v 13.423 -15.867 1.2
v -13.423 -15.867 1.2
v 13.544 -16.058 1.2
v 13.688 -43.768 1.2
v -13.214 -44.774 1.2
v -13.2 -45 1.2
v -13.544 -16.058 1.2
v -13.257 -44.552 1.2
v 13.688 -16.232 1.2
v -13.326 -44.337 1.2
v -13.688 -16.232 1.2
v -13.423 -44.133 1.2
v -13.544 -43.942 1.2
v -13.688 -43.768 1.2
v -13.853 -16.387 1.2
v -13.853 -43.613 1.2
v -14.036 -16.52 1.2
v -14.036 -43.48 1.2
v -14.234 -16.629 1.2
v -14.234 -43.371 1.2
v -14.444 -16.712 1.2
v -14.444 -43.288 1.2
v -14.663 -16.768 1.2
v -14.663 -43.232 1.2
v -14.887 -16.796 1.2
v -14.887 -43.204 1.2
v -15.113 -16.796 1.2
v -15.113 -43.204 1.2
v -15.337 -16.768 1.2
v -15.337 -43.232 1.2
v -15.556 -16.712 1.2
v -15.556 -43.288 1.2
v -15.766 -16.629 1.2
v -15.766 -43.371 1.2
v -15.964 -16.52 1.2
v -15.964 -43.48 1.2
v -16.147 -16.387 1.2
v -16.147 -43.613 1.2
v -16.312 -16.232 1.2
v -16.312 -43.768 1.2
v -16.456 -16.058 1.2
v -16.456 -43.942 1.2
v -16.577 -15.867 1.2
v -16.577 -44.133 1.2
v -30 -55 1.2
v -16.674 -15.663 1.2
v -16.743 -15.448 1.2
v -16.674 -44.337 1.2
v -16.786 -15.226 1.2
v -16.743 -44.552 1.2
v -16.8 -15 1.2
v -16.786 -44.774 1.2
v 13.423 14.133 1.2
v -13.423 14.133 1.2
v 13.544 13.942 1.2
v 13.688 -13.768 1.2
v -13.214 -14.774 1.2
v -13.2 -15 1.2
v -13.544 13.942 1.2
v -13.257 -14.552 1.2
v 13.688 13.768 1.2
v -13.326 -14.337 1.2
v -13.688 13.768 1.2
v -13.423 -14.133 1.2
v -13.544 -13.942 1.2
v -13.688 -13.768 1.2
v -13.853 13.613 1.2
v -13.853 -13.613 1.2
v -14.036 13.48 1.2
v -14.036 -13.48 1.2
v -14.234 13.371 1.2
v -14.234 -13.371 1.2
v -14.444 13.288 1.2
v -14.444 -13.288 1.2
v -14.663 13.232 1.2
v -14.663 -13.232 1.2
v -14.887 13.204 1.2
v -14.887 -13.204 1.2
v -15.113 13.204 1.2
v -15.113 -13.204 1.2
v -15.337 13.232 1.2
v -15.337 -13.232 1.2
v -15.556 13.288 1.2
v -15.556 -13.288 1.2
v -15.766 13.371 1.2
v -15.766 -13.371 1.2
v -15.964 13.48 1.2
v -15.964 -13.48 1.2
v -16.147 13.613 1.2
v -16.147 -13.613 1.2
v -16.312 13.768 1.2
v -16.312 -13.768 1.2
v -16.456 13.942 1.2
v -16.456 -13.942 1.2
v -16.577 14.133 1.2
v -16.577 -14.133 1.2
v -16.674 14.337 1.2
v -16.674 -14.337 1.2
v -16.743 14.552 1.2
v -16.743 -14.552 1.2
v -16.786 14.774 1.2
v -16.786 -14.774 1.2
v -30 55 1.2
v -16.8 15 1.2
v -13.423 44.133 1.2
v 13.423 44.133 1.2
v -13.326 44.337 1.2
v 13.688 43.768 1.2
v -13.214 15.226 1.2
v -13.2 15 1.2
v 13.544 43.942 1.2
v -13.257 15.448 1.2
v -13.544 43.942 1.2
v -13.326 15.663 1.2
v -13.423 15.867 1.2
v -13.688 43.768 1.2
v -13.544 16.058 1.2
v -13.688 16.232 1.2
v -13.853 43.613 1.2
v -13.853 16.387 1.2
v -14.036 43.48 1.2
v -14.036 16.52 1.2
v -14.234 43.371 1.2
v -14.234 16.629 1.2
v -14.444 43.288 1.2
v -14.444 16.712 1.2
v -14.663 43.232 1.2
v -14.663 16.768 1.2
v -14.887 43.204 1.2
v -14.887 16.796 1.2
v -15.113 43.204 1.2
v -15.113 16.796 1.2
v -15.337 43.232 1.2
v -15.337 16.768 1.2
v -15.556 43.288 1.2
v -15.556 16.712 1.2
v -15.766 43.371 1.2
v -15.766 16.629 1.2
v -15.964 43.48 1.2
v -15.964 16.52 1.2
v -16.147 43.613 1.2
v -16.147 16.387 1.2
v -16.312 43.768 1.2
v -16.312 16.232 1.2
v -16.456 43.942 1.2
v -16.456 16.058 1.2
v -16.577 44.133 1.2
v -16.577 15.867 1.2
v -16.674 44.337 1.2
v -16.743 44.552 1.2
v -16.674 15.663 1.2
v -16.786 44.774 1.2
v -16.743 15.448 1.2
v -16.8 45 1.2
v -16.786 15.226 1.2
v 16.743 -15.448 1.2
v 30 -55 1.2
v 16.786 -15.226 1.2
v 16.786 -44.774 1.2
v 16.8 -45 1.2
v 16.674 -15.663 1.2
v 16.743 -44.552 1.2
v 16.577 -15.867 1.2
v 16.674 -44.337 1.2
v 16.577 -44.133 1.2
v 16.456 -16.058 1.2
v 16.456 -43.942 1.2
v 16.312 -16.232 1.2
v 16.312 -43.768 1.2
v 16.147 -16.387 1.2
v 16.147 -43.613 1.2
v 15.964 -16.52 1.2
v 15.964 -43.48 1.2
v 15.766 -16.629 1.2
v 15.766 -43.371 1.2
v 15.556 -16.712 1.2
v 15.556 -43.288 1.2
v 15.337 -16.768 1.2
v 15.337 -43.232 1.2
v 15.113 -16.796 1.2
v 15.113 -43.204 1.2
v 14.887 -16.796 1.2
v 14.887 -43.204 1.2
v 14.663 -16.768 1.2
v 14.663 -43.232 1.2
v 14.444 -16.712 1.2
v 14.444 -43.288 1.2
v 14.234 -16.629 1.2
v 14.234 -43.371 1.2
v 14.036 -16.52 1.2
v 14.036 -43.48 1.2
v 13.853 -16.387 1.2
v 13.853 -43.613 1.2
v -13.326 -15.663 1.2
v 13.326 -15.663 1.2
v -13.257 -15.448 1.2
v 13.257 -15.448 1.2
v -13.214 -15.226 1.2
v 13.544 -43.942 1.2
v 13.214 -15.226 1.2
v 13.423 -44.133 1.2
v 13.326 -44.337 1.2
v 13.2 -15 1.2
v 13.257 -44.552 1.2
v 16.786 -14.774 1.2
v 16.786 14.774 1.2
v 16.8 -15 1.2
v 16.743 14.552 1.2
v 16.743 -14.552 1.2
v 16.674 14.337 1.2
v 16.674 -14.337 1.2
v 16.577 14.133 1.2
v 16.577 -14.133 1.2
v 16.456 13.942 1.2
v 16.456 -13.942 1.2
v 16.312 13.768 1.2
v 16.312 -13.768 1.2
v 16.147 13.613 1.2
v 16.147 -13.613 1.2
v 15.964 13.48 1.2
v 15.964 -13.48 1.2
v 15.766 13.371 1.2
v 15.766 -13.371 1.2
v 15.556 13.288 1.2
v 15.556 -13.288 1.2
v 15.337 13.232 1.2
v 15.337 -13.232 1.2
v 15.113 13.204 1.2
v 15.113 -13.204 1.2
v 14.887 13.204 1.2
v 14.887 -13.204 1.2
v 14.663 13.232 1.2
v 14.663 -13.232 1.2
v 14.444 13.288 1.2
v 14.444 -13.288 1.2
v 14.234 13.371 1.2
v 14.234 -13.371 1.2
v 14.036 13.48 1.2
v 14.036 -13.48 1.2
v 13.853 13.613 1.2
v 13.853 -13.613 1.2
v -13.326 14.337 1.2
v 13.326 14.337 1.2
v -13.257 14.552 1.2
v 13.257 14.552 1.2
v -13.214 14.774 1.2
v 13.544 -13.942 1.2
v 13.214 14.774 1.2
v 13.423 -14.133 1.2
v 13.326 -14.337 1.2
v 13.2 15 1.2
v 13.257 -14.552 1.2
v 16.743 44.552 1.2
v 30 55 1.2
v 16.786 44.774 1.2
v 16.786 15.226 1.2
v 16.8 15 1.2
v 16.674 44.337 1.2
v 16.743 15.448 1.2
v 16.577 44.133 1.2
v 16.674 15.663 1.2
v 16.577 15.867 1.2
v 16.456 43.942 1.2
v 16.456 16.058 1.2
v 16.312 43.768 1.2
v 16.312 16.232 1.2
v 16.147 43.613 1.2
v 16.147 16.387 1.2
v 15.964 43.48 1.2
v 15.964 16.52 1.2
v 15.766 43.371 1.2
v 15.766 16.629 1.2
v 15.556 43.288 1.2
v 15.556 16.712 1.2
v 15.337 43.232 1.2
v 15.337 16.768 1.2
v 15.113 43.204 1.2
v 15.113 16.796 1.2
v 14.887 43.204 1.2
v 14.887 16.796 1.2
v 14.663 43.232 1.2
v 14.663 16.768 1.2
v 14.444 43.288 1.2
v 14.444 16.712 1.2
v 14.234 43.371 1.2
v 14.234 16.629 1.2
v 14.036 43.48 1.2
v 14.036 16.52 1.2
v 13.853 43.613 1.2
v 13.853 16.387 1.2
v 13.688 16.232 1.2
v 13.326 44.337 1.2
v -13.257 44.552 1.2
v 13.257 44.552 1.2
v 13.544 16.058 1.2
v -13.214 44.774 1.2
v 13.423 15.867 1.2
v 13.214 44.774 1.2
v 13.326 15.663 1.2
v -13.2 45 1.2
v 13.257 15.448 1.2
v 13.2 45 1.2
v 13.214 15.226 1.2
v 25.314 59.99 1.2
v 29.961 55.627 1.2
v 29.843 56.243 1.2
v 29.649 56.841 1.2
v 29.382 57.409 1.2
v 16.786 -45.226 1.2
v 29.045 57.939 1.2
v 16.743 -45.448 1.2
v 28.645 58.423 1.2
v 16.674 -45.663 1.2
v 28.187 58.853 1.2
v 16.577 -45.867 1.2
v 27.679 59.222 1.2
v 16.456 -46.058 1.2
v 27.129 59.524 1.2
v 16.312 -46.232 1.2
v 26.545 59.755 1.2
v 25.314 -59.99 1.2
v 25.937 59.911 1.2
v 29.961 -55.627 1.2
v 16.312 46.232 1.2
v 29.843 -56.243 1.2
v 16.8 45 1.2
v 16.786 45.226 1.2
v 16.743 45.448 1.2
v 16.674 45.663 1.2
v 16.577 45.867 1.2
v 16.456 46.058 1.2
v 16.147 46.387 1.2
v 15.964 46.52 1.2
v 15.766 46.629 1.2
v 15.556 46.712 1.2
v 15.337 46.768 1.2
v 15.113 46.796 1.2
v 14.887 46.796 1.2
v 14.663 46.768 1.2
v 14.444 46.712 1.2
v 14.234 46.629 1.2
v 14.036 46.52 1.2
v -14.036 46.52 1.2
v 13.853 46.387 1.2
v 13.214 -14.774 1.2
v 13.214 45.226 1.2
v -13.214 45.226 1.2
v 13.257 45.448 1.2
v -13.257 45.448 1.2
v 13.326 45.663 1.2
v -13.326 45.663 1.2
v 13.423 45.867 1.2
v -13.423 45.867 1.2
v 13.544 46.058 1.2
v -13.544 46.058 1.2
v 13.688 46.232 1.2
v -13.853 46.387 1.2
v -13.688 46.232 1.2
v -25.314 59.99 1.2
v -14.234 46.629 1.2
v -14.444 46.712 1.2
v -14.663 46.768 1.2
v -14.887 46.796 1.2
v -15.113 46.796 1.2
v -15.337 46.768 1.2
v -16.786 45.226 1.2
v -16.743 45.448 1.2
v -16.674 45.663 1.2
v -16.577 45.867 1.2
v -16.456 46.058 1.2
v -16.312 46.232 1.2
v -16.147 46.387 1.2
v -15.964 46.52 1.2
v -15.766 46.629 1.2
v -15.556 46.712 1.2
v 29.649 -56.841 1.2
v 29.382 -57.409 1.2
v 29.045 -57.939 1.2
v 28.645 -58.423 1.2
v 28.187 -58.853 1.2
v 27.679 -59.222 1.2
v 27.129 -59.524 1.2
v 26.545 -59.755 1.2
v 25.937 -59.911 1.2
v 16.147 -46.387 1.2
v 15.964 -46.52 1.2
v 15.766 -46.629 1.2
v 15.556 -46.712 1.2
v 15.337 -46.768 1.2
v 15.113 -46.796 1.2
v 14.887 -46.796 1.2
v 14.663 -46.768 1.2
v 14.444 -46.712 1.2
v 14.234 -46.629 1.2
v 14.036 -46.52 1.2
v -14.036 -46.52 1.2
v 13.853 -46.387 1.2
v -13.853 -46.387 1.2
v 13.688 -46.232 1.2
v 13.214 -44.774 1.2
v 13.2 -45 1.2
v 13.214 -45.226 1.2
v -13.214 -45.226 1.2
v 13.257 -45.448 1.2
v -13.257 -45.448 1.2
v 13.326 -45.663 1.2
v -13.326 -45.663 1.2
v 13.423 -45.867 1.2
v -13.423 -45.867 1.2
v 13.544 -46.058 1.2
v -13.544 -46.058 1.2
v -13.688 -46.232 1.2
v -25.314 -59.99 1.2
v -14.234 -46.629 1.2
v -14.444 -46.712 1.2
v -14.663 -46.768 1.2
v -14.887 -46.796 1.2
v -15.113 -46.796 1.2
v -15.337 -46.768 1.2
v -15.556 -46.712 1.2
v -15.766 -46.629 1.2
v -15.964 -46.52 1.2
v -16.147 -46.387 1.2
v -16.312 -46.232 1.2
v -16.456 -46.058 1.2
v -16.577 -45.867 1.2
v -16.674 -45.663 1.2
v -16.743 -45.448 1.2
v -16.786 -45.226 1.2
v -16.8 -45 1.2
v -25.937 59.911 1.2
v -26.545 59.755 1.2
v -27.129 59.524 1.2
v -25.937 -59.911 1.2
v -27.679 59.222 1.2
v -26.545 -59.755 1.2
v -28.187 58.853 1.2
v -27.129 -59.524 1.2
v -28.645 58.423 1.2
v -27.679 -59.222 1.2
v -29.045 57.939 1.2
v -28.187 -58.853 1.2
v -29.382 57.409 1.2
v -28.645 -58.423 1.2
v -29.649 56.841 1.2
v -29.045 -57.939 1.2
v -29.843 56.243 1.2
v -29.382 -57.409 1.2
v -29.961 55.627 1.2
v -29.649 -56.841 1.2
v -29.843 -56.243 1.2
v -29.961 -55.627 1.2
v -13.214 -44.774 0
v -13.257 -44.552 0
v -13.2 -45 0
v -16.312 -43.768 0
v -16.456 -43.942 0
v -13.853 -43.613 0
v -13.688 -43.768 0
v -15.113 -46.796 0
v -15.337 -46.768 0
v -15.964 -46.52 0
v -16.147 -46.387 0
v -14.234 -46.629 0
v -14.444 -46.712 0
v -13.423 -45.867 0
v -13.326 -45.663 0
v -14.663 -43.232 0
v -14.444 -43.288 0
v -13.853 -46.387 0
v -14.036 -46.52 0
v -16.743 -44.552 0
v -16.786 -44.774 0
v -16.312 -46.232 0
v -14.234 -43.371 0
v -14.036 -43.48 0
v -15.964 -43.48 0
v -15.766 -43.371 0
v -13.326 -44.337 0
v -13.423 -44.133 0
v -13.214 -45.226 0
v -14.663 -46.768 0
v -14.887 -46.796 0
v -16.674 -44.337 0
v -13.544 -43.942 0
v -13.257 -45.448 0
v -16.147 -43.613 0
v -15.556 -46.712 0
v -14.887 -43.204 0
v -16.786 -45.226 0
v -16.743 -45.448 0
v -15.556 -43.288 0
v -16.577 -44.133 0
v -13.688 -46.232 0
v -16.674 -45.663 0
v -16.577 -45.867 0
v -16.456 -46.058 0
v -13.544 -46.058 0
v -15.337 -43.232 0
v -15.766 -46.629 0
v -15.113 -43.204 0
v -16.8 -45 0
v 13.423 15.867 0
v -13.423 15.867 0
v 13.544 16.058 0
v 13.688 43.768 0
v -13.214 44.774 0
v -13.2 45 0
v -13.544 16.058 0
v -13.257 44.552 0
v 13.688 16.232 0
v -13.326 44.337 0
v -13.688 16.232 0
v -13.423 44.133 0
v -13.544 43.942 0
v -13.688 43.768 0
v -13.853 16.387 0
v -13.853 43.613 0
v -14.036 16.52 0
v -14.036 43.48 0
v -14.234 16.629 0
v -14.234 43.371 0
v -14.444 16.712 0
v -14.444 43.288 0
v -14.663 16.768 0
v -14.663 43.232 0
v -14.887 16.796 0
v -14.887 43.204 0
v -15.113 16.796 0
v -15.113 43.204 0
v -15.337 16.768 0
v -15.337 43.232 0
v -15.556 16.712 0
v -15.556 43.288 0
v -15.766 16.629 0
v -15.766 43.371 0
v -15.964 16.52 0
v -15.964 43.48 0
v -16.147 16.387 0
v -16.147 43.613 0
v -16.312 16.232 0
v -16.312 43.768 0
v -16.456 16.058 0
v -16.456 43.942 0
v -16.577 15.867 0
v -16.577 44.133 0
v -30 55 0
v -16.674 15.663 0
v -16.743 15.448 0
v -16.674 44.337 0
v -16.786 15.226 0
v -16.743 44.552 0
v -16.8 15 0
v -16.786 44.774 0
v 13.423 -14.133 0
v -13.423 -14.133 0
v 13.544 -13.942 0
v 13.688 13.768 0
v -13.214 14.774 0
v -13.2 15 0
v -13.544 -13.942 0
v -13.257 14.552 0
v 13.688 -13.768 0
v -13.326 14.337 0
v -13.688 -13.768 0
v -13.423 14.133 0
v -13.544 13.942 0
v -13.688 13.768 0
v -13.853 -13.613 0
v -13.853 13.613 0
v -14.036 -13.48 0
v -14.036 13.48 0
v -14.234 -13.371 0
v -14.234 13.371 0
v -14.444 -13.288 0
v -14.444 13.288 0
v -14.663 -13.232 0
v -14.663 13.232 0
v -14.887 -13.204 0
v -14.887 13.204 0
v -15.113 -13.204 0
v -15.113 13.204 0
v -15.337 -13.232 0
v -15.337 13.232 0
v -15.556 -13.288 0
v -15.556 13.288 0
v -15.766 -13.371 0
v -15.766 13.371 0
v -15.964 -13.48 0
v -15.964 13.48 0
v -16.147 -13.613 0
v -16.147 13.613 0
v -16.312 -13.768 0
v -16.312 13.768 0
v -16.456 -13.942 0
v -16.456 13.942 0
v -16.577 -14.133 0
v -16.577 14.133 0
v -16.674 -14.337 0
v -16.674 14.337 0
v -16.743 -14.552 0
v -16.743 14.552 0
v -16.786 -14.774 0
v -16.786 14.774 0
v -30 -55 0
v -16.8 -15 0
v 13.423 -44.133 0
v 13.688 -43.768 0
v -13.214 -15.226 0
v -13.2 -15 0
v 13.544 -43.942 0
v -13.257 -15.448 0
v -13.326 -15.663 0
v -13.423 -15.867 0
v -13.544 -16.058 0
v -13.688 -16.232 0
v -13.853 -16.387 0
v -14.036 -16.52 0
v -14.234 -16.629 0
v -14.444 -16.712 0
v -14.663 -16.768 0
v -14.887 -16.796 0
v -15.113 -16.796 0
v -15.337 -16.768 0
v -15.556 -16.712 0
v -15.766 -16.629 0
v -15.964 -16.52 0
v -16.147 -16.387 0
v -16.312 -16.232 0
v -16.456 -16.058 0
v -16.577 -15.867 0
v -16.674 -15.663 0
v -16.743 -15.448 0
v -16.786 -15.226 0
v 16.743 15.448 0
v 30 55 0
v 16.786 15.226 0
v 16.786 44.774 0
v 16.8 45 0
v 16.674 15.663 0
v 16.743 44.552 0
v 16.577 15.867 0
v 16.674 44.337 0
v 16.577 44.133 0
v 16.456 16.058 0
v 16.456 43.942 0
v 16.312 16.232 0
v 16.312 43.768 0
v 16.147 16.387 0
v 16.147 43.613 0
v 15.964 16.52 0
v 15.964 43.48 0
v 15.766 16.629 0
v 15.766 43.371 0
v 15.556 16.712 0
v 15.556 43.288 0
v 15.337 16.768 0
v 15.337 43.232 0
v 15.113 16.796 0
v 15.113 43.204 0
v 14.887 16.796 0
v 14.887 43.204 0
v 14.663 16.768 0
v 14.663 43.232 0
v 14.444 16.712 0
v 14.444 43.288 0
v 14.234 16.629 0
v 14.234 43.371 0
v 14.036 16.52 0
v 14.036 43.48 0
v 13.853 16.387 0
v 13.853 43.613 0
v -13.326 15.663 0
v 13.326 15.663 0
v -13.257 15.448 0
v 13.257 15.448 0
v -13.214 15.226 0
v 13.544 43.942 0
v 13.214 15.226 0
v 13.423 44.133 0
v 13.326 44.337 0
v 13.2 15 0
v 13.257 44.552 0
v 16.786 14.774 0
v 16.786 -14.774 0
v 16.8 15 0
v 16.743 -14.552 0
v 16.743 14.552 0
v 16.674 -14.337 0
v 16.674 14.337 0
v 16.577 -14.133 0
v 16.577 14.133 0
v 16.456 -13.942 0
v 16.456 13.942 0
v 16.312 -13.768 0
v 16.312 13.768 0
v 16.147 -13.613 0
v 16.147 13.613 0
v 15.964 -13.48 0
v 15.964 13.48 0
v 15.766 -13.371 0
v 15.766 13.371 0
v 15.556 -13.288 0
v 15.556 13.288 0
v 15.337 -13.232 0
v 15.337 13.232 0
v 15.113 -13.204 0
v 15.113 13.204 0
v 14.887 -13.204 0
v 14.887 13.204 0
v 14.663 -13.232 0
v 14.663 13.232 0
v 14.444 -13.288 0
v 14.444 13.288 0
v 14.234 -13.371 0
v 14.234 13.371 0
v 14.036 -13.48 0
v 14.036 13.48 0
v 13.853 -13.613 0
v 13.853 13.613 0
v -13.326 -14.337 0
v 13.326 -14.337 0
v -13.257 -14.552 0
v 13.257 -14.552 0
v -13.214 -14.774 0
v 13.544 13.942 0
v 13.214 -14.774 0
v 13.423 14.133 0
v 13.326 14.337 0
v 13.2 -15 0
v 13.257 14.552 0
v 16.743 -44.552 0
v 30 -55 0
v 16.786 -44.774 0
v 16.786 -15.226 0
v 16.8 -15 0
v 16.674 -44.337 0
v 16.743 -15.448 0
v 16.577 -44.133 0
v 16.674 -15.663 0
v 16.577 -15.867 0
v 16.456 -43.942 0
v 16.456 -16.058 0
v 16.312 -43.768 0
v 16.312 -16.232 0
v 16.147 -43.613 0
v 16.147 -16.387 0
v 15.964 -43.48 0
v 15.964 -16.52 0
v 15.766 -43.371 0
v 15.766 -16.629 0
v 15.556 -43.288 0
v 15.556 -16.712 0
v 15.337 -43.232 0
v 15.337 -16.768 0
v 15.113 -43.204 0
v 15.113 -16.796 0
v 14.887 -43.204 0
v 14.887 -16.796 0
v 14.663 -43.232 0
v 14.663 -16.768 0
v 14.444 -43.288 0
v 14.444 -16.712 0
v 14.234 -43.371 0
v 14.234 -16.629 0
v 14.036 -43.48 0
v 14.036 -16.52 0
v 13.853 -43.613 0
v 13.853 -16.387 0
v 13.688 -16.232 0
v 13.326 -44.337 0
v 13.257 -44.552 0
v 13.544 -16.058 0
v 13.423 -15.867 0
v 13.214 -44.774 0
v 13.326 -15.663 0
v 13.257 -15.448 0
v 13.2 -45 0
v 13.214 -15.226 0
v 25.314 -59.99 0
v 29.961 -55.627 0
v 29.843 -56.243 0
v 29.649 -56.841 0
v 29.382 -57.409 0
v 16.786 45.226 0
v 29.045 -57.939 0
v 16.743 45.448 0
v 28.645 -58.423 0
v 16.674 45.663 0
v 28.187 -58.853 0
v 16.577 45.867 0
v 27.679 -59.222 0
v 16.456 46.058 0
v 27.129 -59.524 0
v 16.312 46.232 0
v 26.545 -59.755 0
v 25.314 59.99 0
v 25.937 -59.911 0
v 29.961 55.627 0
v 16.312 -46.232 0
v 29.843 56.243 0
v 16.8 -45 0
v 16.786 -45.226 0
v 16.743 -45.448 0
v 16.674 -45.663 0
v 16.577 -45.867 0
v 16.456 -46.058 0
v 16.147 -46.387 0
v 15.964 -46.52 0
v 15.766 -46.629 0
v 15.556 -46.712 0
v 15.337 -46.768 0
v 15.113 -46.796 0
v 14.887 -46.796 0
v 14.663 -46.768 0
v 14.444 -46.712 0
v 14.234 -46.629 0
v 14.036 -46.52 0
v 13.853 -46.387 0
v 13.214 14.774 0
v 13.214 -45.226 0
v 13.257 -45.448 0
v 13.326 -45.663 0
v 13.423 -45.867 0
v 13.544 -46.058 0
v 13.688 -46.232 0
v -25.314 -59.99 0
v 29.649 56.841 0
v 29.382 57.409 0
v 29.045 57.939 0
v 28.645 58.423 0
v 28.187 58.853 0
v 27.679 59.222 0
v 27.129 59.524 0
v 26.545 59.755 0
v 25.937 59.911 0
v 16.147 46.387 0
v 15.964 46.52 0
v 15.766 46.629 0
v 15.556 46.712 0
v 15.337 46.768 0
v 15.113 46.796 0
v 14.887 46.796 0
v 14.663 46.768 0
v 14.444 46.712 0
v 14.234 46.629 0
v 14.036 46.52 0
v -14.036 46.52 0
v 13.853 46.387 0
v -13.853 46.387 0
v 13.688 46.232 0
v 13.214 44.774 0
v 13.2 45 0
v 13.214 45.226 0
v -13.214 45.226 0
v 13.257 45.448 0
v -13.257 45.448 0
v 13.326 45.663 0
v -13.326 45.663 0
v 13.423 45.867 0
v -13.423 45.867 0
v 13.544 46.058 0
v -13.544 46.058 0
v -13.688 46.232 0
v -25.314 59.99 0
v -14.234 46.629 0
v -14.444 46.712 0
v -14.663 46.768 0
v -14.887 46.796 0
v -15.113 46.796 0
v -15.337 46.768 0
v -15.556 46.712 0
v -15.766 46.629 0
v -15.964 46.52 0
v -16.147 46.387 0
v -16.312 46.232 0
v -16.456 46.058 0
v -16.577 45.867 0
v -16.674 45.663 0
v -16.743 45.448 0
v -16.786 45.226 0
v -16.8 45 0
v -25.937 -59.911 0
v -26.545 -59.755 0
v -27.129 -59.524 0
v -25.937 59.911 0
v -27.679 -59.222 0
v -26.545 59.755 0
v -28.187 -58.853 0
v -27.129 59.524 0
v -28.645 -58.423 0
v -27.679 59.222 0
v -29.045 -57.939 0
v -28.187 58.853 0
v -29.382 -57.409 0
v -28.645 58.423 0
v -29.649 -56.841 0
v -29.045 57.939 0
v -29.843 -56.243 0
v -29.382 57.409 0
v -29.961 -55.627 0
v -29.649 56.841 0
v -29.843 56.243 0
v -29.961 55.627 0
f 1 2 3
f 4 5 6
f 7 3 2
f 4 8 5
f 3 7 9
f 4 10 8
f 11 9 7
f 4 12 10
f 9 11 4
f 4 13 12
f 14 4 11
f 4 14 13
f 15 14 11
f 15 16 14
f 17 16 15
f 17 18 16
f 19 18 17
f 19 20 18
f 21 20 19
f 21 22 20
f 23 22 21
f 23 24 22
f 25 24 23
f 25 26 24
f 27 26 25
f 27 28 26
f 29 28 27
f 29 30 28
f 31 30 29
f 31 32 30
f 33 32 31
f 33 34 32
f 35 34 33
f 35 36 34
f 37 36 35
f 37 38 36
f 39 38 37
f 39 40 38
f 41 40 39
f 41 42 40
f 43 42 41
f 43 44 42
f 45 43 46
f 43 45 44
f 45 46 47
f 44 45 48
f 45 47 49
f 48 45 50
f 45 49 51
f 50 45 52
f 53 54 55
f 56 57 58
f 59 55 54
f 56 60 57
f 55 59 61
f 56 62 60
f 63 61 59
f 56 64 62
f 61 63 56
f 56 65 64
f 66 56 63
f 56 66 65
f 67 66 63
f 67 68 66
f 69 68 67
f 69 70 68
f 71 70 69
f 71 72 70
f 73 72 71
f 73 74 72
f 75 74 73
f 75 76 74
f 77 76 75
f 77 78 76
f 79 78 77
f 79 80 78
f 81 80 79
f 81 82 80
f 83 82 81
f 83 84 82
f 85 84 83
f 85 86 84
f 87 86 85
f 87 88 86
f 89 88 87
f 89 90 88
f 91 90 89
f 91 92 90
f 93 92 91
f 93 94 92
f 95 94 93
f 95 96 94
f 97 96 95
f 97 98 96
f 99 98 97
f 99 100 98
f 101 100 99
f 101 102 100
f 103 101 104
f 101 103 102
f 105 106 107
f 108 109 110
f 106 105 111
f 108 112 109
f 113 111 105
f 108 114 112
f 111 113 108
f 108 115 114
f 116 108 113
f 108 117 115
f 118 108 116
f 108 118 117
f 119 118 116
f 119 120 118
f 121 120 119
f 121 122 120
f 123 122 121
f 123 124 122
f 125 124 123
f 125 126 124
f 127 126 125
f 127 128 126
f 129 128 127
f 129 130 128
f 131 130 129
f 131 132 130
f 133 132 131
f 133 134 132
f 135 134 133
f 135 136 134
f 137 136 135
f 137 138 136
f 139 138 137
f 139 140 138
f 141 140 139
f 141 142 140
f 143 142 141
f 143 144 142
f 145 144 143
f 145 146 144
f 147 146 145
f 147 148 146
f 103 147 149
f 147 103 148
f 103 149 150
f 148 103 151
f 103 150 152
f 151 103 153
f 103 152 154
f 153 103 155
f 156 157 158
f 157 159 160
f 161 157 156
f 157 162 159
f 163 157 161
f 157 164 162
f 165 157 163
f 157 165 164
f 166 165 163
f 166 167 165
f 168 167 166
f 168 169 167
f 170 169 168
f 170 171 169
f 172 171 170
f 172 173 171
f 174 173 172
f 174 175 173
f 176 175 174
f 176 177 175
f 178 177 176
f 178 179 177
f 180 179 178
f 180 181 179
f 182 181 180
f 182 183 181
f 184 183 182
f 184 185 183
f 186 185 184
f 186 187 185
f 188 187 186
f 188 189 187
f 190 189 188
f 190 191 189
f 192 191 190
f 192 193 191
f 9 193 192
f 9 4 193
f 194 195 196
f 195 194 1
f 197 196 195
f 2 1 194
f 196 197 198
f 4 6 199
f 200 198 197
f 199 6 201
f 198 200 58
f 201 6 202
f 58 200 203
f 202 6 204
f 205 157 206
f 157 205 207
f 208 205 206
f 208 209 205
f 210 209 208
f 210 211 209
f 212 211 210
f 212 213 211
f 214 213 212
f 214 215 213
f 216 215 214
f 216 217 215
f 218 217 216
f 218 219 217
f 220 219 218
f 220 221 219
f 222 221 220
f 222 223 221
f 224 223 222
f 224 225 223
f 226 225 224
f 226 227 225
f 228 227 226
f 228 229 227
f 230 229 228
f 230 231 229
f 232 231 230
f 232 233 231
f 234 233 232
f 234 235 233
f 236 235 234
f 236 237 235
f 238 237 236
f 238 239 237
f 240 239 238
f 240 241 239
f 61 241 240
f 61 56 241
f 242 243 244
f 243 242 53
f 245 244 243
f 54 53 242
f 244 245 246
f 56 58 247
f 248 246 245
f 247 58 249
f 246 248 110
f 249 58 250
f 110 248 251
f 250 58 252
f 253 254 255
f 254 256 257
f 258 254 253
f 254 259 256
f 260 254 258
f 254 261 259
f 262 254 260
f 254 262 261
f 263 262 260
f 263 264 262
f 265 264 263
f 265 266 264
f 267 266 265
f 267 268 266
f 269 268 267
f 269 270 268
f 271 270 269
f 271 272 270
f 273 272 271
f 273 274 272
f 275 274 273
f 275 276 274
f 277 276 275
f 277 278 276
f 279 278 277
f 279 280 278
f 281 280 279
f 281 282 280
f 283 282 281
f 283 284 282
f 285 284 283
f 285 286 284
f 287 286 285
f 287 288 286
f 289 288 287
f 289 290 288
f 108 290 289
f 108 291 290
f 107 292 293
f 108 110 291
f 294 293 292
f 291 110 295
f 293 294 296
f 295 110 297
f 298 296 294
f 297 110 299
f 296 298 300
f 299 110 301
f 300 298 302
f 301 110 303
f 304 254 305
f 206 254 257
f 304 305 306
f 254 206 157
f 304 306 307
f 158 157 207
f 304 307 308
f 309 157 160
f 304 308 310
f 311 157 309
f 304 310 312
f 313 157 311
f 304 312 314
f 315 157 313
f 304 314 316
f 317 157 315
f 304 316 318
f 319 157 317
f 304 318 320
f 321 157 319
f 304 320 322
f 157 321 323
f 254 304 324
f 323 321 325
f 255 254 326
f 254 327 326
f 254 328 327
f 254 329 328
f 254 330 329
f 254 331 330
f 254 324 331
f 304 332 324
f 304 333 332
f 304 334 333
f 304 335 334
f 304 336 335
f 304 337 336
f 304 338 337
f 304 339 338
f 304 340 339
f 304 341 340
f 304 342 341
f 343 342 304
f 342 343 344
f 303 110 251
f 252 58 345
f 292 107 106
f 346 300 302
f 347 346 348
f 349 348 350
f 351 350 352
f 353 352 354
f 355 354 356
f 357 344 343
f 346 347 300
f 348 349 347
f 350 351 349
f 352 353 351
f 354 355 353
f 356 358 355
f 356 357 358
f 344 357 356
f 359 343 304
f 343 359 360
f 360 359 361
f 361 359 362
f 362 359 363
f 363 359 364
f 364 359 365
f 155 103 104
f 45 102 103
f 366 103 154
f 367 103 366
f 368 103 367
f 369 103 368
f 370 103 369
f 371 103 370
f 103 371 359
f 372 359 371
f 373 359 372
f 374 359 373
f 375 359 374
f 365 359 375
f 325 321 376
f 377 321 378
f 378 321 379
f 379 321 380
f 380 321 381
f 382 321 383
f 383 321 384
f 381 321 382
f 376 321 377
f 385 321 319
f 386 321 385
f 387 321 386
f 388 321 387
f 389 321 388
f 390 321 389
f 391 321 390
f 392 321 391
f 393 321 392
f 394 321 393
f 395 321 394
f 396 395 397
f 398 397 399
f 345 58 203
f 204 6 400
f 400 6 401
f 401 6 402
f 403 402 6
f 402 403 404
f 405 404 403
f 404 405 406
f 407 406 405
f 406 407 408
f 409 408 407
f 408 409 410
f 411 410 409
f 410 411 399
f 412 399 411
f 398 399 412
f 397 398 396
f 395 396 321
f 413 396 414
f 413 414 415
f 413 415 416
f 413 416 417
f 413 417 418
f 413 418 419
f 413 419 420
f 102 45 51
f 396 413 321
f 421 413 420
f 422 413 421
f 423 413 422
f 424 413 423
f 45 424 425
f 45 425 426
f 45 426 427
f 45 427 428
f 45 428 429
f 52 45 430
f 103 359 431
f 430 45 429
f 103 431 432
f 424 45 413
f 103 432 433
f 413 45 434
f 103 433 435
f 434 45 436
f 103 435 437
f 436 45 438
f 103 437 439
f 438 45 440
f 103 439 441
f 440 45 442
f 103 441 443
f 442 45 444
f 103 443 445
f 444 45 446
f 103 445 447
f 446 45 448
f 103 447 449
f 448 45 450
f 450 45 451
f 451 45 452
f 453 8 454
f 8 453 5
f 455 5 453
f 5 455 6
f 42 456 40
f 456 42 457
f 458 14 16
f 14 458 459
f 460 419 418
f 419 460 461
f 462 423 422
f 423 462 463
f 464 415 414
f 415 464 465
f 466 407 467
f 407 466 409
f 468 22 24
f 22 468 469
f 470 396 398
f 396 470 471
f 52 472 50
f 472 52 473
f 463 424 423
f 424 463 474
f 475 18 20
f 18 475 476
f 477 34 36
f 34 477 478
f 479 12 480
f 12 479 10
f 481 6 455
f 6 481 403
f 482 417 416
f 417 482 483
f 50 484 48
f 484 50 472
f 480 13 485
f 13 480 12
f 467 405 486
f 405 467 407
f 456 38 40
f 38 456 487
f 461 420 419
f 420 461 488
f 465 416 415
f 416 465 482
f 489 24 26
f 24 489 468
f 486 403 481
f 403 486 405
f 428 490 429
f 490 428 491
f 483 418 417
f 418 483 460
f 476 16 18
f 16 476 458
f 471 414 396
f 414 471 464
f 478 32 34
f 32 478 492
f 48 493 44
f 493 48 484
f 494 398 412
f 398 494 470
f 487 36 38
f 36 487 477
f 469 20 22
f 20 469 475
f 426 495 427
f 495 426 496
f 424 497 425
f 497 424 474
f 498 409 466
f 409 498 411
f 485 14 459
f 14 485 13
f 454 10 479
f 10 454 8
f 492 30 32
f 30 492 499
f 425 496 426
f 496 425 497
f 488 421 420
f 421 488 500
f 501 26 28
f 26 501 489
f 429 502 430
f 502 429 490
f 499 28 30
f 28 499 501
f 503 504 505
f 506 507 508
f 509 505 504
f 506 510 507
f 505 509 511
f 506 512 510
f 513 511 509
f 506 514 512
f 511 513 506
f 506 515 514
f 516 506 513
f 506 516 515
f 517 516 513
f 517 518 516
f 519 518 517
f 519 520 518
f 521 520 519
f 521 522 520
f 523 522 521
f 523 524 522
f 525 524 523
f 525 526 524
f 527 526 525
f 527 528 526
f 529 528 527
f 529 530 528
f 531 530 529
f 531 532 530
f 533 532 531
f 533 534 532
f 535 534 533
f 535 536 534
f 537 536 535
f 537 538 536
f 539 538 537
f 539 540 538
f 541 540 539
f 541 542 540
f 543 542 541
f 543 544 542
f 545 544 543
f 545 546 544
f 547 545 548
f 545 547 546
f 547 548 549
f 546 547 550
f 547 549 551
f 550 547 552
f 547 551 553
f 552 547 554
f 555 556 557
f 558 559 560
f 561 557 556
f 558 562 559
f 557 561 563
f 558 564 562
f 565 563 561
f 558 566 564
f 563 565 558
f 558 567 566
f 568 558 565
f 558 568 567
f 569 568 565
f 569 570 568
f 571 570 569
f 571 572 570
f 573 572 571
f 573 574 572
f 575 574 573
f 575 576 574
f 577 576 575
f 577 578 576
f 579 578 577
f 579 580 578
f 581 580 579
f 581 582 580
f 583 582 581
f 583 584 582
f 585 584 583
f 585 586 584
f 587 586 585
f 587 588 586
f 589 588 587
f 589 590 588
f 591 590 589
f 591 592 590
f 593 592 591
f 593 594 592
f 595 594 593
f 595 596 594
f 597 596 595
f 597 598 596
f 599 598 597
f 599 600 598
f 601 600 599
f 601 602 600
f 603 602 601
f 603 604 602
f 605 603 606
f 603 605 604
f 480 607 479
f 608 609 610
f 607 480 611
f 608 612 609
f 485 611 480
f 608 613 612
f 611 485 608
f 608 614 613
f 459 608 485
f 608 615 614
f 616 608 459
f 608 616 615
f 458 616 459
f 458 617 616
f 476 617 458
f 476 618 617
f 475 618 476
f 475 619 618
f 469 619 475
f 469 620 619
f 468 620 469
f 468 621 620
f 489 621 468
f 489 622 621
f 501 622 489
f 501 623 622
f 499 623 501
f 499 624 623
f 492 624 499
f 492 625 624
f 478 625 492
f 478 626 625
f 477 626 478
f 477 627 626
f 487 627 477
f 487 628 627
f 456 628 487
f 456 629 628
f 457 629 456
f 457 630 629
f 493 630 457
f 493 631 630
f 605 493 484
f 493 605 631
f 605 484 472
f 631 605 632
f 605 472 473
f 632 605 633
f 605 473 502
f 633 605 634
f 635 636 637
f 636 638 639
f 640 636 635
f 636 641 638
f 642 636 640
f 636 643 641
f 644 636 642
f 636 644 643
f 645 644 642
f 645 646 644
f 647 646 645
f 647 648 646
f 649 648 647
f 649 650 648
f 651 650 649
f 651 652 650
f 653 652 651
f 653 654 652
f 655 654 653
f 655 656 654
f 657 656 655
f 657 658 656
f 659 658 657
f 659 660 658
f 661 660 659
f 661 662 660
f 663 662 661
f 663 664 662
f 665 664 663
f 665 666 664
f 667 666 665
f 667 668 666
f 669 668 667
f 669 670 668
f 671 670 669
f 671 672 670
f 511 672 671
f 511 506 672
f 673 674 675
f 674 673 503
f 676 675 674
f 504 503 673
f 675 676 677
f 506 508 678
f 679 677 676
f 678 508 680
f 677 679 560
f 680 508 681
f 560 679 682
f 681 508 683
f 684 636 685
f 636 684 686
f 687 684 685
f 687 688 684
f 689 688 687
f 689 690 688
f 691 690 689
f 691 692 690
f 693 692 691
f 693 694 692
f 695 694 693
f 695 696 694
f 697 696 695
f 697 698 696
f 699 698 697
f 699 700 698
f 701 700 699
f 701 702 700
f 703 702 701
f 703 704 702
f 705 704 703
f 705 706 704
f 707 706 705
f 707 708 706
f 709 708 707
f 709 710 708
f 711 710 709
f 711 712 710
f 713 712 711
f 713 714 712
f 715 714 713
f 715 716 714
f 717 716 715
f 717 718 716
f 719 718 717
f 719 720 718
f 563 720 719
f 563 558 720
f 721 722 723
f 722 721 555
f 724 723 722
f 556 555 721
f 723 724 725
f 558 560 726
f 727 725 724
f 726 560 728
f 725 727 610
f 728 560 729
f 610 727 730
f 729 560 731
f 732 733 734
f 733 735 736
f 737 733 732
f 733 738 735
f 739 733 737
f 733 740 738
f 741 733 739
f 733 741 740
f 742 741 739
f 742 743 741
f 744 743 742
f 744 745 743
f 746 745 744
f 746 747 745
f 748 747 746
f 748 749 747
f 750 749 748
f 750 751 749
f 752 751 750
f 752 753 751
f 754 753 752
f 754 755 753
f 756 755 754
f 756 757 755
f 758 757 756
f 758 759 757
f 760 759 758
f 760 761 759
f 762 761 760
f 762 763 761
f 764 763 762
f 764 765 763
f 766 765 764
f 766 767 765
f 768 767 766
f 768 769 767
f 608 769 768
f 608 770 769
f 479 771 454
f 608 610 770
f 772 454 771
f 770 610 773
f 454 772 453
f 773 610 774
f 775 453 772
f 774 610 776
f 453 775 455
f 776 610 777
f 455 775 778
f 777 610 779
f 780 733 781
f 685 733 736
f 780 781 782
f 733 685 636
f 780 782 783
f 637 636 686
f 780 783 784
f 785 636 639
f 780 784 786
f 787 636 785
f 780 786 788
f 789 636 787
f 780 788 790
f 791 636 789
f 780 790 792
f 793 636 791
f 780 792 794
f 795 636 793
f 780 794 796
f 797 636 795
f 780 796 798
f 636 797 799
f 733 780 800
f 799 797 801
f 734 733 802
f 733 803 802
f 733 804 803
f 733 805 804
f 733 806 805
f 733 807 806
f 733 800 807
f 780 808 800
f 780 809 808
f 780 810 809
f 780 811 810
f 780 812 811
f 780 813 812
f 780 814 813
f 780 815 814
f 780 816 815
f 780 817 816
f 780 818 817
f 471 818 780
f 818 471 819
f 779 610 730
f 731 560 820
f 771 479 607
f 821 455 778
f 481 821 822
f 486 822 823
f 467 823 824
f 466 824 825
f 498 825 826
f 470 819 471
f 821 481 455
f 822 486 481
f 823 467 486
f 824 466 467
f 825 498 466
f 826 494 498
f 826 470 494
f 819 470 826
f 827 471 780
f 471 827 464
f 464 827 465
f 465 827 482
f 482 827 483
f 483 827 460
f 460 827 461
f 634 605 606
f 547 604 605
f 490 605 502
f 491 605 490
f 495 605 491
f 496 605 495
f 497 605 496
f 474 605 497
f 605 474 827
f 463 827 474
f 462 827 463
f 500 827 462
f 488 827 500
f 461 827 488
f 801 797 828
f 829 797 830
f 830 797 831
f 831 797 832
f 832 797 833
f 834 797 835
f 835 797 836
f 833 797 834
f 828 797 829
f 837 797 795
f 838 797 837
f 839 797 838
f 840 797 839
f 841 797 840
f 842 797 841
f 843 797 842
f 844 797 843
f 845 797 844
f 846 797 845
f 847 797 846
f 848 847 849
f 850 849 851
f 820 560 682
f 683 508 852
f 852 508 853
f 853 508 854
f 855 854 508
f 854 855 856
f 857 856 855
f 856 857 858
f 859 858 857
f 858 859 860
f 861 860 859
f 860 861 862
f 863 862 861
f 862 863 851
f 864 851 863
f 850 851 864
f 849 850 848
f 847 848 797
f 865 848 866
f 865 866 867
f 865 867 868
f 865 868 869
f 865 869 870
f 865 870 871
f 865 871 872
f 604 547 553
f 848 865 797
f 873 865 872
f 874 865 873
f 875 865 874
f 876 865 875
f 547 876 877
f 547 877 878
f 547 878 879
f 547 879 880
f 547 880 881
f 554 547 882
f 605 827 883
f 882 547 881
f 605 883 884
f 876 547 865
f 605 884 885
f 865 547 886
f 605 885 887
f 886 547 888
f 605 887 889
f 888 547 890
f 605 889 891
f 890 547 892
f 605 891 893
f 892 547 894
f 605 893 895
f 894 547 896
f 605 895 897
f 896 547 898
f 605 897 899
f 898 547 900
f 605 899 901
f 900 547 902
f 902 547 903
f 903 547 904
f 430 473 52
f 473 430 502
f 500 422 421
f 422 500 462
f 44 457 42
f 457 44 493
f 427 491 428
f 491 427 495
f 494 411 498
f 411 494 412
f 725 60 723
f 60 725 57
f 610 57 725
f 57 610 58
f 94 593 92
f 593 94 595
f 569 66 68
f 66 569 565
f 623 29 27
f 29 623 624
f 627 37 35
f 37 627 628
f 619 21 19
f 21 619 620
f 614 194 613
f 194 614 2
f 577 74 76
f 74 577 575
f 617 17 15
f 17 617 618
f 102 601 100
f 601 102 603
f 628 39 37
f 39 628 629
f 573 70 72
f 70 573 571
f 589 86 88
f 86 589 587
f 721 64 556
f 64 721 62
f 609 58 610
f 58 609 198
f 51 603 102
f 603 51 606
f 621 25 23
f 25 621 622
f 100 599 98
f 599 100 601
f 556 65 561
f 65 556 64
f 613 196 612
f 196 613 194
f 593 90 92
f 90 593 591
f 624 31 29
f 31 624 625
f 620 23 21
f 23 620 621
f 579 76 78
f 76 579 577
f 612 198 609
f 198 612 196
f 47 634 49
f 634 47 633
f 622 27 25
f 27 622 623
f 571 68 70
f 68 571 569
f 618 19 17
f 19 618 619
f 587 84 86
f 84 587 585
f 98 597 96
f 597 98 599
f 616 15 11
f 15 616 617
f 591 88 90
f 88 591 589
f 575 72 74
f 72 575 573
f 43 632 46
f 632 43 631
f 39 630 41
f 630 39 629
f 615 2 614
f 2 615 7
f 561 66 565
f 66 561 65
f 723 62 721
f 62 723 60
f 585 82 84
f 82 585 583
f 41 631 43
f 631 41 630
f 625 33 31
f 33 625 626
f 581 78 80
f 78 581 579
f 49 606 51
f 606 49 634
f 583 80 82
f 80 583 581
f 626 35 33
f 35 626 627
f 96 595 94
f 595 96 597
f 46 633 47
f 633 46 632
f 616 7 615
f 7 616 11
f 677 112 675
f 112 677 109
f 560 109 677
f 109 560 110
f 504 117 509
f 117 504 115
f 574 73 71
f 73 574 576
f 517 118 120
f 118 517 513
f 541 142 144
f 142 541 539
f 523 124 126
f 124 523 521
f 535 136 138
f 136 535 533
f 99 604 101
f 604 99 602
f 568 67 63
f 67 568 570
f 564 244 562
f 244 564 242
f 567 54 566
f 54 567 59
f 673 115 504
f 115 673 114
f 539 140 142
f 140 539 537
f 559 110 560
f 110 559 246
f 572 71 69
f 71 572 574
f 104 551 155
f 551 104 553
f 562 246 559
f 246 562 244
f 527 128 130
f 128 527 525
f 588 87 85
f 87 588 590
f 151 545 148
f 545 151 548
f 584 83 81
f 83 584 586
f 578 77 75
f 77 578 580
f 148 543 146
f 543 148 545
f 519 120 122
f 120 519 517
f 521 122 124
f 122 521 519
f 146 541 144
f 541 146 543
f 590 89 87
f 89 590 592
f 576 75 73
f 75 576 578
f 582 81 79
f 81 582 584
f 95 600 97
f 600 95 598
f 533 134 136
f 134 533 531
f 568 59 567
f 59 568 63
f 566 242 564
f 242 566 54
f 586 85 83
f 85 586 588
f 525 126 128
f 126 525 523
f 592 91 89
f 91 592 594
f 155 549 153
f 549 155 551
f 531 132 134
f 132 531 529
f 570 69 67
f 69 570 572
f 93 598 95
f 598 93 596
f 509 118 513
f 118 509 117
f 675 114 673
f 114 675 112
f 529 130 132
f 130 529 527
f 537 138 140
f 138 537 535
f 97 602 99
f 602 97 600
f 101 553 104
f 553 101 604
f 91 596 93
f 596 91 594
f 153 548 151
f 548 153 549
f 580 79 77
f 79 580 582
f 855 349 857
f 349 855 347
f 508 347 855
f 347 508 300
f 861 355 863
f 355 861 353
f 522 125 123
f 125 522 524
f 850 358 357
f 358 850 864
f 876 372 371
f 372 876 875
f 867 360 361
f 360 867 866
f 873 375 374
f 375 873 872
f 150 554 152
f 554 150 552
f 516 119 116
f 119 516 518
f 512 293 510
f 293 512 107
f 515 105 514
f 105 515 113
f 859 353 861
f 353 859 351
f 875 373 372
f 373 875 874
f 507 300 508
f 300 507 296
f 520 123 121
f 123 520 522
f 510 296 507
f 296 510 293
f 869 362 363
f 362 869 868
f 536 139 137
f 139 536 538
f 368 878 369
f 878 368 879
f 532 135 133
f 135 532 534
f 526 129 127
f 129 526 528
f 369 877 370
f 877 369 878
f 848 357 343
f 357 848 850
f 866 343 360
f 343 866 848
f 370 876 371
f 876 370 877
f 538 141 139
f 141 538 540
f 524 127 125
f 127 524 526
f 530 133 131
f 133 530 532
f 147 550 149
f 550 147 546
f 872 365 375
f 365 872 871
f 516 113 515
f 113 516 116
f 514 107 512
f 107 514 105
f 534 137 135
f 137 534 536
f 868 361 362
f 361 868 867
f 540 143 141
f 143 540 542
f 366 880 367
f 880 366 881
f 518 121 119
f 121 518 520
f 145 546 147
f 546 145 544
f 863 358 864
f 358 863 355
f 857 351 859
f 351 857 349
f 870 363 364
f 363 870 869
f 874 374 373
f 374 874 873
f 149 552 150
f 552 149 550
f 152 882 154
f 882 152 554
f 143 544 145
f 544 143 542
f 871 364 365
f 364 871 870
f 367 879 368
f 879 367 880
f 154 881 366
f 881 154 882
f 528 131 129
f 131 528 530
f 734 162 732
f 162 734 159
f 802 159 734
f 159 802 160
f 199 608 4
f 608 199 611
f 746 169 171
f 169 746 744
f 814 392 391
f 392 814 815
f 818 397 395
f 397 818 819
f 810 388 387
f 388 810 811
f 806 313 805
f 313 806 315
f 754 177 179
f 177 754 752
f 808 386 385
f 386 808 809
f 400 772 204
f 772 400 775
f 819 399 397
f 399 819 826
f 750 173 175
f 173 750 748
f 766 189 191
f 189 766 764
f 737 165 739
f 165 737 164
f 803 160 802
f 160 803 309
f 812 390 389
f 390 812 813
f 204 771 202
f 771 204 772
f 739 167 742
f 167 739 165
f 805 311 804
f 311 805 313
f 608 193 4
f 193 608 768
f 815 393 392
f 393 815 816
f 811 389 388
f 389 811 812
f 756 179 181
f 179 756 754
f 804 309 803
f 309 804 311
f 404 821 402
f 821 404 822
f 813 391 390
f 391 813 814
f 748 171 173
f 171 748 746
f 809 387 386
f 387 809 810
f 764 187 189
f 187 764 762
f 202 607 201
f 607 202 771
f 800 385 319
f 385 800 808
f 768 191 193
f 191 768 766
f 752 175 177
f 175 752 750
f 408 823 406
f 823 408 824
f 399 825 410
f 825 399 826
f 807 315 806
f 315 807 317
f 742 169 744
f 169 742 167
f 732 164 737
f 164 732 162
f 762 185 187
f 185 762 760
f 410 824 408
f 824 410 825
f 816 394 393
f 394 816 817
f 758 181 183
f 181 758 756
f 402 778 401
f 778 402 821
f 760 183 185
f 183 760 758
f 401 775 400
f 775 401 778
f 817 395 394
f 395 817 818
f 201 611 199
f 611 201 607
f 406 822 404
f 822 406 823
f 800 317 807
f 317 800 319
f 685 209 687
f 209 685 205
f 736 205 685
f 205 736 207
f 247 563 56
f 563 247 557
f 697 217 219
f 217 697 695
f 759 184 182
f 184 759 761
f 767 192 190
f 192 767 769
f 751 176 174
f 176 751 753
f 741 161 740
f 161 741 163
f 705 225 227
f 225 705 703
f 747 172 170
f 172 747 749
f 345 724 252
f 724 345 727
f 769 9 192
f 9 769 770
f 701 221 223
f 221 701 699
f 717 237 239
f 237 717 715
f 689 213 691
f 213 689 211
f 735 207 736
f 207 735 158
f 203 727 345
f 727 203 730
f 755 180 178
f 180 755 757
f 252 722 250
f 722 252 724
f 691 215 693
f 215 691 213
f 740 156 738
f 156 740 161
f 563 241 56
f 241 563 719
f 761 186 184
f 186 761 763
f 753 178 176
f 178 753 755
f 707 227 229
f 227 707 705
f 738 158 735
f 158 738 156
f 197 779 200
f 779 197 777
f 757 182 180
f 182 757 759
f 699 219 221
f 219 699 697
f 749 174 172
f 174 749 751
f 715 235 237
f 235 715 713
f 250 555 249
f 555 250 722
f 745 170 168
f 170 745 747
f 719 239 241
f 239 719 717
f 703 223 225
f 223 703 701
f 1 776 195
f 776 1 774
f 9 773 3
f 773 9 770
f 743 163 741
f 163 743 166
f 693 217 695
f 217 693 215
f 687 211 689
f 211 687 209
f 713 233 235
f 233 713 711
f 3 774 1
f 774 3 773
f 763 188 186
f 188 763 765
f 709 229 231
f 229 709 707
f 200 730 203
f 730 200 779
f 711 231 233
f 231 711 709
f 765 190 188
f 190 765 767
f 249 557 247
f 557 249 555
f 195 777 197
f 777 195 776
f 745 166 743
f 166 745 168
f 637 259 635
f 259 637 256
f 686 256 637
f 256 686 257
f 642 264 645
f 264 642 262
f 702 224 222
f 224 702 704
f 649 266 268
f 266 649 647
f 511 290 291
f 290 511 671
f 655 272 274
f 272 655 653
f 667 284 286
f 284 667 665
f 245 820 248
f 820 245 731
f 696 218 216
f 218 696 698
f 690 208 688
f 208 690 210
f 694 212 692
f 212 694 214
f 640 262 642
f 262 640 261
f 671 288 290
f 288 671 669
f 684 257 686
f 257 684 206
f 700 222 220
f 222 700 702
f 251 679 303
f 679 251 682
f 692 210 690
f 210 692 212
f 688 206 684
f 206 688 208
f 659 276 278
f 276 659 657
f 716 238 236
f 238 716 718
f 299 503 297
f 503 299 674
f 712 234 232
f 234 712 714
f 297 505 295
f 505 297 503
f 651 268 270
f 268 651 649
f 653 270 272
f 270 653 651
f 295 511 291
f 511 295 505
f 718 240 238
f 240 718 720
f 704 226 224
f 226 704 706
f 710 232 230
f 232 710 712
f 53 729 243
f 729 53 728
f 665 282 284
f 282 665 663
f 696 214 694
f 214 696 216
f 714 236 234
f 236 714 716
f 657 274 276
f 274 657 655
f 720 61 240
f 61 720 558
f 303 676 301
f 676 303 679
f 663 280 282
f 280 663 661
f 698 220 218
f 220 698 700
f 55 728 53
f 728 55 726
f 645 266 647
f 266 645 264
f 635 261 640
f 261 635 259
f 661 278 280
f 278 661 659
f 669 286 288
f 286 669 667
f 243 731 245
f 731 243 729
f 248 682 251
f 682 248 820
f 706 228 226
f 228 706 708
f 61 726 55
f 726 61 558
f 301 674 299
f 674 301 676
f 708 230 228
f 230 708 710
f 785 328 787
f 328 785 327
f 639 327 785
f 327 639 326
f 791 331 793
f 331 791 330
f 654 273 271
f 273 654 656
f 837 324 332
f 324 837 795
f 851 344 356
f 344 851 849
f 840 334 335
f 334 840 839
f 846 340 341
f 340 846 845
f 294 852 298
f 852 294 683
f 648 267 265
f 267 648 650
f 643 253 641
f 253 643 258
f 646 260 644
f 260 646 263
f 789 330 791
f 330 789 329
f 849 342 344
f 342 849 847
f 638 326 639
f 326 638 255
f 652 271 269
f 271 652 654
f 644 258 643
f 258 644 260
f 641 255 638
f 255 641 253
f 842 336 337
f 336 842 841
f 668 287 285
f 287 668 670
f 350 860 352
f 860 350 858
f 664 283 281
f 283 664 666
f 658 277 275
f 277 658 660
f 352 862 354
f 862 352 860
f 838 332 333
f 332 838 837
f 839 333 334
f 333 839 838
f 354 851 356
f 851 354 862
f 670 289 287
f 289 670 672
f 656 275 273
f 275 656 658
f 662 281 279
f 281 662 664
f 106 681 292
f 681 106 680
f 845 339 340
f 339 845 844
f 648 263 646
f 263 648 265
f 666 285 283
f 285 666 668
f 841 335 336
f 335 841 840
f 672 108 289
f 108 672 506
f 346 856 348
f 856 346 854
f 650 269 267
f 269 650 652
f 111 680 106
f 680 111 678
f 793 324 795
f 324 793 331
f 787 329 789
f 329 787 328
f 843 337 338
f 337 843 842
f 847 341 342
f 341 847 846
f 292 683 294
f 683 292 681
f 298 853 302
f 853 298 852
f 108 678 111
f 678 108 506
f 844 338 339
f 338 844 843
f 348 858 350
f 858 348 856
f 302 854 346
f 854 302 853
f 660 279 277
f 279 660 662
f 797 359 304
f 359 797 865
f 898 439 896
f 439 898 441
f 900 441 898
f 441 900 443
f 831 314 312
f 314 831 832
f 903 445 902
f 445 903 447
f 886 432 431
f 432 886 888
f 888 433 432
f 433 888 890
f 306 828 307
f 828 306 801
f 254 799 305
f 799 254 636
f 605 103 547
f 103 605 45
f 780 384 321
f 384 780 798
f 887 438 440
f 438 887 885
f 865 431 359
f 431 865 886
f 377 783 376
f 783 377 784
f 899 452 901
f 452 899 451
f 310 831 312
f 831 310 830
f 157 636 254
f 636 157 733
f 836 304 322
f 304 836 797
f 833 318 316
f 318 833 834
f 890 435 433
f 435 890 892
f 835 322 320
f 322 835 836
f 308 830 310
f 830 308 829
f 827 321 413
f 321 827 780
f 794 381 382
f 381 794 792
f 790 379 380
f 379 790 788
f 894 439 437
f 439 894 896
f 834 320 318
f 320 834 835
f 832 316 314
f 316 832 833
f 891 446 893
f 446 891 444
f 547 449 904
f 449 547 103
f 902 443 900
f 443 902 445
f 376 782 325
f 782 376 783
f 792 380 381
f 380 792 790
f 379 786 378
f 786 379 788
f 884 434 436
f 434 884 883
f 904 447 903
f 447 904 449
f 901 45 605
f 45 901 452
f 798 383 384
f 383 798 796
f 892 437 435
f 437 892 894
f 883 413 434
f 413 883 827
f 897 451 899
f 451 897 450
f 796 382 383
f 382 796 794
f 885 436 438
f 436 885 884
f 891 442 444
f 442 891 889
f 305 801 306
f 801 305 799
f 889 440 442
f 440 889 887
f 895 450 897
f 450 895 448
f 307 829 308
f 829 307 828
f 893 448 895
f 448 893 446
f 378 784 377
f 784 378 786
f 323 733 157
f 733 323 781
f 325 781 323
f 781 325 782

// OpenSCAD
$fn = 50;


difference() {
	union() {
		hull() {
			translate(v = [-25.0000000000, 55.0000000000, 0]) {
				cylinder(h = 24, r = 5);
			}
			translate(v = [25.0000000000, 55.0000000000, 0]) {
				cylinder(h = 24, r = 5);
			}
			translate(v = [-25.0000000000, -55.0000000000, 0]) {
				cylinder(h = 24, r = 5);
			}
			translate(v = [25.0000000000, -55.0000000000, 0]) {
				cylinder(h = 24, r = 5);
			}
		}
	}
	union() {
		translate(v = [0, 0, 1.2000000000]) {
			hull() {
				translate(v = [-25.0000000000, 55.0000000000, 0]) {
					cylinder(h = 22.8000000000, r = 3.8000000000);
				}
				translate(v = [25.0000000000, 55.0000000000, 0]) {
					cylinder(h = 22.8000000000, r = 3.8000000000);
				}
				translate(v = [-25.0000000000, -55.0000000000, 0]) {
					cylinder(h = 22.8000000000, r = 3.8000000000);
				}
				translate(v = [25.0000000000, -55.0000000000, 0]) {
					cylinder(h = 22.8000000000, r = 3.8000000000);
				}
			}
		}
		#translate(v = [-15.0000000000, -45.0000000000, 0]) {
			cylinder(h = 1.2000000000, r = 1.8000000000);
		}
		#translate(v = [-15.0000000000, -15.0000000000, 0]) {
			cylinder(h = 1.2000000000, r = 1.8000000000);
		}
		#translate(v = [-15.0000000000, 15.0000000000, 0]) {
			cylinder(h = 1.2000000000, r = 1.8000000000);
		}
		#translate(v = [-15.0000000000, 45.0000000000, 0]) {
			cylinder(h = 1.2000000000, r = 1.8000000000);
		}
		#translate(v = [15.0000000000, -45.0000000000, 0]) {
			cylinder(h = 1.2000000000, r = 1.8000000000);
		}
		#translate(v = [15.0000000000, -15.0000000000, 0]) {
			cylinder(h = 1.2000000000, r = 1.8000000000);
		}
		#translate(v = [15.0000000000, 15.0000000000, 0]) {
			cylinder(h = 1.2000000000, r = 1.8000000000);
		}
		#translate(v = [15.0000000000, 45.0000000000, 0]) {
			cylinder(h = 1.2000000000, r = 1.8000000000);
		}
		translate(v = [-250.0000000000, -250.0000000000, 1.2000000000]) {
			cube(size = [500, 500, 500]);
		}
		translate(v = [-250.0000000000, -250.0000000000, 1.2000000000]) {
			cube(size = [500, 500, 500]);
		}
		translate(v = [-250.0000000000, -250.0000000000, 1.2000000000]) {
			cube(size = [500, 500, 500]);
		}
	}
}
